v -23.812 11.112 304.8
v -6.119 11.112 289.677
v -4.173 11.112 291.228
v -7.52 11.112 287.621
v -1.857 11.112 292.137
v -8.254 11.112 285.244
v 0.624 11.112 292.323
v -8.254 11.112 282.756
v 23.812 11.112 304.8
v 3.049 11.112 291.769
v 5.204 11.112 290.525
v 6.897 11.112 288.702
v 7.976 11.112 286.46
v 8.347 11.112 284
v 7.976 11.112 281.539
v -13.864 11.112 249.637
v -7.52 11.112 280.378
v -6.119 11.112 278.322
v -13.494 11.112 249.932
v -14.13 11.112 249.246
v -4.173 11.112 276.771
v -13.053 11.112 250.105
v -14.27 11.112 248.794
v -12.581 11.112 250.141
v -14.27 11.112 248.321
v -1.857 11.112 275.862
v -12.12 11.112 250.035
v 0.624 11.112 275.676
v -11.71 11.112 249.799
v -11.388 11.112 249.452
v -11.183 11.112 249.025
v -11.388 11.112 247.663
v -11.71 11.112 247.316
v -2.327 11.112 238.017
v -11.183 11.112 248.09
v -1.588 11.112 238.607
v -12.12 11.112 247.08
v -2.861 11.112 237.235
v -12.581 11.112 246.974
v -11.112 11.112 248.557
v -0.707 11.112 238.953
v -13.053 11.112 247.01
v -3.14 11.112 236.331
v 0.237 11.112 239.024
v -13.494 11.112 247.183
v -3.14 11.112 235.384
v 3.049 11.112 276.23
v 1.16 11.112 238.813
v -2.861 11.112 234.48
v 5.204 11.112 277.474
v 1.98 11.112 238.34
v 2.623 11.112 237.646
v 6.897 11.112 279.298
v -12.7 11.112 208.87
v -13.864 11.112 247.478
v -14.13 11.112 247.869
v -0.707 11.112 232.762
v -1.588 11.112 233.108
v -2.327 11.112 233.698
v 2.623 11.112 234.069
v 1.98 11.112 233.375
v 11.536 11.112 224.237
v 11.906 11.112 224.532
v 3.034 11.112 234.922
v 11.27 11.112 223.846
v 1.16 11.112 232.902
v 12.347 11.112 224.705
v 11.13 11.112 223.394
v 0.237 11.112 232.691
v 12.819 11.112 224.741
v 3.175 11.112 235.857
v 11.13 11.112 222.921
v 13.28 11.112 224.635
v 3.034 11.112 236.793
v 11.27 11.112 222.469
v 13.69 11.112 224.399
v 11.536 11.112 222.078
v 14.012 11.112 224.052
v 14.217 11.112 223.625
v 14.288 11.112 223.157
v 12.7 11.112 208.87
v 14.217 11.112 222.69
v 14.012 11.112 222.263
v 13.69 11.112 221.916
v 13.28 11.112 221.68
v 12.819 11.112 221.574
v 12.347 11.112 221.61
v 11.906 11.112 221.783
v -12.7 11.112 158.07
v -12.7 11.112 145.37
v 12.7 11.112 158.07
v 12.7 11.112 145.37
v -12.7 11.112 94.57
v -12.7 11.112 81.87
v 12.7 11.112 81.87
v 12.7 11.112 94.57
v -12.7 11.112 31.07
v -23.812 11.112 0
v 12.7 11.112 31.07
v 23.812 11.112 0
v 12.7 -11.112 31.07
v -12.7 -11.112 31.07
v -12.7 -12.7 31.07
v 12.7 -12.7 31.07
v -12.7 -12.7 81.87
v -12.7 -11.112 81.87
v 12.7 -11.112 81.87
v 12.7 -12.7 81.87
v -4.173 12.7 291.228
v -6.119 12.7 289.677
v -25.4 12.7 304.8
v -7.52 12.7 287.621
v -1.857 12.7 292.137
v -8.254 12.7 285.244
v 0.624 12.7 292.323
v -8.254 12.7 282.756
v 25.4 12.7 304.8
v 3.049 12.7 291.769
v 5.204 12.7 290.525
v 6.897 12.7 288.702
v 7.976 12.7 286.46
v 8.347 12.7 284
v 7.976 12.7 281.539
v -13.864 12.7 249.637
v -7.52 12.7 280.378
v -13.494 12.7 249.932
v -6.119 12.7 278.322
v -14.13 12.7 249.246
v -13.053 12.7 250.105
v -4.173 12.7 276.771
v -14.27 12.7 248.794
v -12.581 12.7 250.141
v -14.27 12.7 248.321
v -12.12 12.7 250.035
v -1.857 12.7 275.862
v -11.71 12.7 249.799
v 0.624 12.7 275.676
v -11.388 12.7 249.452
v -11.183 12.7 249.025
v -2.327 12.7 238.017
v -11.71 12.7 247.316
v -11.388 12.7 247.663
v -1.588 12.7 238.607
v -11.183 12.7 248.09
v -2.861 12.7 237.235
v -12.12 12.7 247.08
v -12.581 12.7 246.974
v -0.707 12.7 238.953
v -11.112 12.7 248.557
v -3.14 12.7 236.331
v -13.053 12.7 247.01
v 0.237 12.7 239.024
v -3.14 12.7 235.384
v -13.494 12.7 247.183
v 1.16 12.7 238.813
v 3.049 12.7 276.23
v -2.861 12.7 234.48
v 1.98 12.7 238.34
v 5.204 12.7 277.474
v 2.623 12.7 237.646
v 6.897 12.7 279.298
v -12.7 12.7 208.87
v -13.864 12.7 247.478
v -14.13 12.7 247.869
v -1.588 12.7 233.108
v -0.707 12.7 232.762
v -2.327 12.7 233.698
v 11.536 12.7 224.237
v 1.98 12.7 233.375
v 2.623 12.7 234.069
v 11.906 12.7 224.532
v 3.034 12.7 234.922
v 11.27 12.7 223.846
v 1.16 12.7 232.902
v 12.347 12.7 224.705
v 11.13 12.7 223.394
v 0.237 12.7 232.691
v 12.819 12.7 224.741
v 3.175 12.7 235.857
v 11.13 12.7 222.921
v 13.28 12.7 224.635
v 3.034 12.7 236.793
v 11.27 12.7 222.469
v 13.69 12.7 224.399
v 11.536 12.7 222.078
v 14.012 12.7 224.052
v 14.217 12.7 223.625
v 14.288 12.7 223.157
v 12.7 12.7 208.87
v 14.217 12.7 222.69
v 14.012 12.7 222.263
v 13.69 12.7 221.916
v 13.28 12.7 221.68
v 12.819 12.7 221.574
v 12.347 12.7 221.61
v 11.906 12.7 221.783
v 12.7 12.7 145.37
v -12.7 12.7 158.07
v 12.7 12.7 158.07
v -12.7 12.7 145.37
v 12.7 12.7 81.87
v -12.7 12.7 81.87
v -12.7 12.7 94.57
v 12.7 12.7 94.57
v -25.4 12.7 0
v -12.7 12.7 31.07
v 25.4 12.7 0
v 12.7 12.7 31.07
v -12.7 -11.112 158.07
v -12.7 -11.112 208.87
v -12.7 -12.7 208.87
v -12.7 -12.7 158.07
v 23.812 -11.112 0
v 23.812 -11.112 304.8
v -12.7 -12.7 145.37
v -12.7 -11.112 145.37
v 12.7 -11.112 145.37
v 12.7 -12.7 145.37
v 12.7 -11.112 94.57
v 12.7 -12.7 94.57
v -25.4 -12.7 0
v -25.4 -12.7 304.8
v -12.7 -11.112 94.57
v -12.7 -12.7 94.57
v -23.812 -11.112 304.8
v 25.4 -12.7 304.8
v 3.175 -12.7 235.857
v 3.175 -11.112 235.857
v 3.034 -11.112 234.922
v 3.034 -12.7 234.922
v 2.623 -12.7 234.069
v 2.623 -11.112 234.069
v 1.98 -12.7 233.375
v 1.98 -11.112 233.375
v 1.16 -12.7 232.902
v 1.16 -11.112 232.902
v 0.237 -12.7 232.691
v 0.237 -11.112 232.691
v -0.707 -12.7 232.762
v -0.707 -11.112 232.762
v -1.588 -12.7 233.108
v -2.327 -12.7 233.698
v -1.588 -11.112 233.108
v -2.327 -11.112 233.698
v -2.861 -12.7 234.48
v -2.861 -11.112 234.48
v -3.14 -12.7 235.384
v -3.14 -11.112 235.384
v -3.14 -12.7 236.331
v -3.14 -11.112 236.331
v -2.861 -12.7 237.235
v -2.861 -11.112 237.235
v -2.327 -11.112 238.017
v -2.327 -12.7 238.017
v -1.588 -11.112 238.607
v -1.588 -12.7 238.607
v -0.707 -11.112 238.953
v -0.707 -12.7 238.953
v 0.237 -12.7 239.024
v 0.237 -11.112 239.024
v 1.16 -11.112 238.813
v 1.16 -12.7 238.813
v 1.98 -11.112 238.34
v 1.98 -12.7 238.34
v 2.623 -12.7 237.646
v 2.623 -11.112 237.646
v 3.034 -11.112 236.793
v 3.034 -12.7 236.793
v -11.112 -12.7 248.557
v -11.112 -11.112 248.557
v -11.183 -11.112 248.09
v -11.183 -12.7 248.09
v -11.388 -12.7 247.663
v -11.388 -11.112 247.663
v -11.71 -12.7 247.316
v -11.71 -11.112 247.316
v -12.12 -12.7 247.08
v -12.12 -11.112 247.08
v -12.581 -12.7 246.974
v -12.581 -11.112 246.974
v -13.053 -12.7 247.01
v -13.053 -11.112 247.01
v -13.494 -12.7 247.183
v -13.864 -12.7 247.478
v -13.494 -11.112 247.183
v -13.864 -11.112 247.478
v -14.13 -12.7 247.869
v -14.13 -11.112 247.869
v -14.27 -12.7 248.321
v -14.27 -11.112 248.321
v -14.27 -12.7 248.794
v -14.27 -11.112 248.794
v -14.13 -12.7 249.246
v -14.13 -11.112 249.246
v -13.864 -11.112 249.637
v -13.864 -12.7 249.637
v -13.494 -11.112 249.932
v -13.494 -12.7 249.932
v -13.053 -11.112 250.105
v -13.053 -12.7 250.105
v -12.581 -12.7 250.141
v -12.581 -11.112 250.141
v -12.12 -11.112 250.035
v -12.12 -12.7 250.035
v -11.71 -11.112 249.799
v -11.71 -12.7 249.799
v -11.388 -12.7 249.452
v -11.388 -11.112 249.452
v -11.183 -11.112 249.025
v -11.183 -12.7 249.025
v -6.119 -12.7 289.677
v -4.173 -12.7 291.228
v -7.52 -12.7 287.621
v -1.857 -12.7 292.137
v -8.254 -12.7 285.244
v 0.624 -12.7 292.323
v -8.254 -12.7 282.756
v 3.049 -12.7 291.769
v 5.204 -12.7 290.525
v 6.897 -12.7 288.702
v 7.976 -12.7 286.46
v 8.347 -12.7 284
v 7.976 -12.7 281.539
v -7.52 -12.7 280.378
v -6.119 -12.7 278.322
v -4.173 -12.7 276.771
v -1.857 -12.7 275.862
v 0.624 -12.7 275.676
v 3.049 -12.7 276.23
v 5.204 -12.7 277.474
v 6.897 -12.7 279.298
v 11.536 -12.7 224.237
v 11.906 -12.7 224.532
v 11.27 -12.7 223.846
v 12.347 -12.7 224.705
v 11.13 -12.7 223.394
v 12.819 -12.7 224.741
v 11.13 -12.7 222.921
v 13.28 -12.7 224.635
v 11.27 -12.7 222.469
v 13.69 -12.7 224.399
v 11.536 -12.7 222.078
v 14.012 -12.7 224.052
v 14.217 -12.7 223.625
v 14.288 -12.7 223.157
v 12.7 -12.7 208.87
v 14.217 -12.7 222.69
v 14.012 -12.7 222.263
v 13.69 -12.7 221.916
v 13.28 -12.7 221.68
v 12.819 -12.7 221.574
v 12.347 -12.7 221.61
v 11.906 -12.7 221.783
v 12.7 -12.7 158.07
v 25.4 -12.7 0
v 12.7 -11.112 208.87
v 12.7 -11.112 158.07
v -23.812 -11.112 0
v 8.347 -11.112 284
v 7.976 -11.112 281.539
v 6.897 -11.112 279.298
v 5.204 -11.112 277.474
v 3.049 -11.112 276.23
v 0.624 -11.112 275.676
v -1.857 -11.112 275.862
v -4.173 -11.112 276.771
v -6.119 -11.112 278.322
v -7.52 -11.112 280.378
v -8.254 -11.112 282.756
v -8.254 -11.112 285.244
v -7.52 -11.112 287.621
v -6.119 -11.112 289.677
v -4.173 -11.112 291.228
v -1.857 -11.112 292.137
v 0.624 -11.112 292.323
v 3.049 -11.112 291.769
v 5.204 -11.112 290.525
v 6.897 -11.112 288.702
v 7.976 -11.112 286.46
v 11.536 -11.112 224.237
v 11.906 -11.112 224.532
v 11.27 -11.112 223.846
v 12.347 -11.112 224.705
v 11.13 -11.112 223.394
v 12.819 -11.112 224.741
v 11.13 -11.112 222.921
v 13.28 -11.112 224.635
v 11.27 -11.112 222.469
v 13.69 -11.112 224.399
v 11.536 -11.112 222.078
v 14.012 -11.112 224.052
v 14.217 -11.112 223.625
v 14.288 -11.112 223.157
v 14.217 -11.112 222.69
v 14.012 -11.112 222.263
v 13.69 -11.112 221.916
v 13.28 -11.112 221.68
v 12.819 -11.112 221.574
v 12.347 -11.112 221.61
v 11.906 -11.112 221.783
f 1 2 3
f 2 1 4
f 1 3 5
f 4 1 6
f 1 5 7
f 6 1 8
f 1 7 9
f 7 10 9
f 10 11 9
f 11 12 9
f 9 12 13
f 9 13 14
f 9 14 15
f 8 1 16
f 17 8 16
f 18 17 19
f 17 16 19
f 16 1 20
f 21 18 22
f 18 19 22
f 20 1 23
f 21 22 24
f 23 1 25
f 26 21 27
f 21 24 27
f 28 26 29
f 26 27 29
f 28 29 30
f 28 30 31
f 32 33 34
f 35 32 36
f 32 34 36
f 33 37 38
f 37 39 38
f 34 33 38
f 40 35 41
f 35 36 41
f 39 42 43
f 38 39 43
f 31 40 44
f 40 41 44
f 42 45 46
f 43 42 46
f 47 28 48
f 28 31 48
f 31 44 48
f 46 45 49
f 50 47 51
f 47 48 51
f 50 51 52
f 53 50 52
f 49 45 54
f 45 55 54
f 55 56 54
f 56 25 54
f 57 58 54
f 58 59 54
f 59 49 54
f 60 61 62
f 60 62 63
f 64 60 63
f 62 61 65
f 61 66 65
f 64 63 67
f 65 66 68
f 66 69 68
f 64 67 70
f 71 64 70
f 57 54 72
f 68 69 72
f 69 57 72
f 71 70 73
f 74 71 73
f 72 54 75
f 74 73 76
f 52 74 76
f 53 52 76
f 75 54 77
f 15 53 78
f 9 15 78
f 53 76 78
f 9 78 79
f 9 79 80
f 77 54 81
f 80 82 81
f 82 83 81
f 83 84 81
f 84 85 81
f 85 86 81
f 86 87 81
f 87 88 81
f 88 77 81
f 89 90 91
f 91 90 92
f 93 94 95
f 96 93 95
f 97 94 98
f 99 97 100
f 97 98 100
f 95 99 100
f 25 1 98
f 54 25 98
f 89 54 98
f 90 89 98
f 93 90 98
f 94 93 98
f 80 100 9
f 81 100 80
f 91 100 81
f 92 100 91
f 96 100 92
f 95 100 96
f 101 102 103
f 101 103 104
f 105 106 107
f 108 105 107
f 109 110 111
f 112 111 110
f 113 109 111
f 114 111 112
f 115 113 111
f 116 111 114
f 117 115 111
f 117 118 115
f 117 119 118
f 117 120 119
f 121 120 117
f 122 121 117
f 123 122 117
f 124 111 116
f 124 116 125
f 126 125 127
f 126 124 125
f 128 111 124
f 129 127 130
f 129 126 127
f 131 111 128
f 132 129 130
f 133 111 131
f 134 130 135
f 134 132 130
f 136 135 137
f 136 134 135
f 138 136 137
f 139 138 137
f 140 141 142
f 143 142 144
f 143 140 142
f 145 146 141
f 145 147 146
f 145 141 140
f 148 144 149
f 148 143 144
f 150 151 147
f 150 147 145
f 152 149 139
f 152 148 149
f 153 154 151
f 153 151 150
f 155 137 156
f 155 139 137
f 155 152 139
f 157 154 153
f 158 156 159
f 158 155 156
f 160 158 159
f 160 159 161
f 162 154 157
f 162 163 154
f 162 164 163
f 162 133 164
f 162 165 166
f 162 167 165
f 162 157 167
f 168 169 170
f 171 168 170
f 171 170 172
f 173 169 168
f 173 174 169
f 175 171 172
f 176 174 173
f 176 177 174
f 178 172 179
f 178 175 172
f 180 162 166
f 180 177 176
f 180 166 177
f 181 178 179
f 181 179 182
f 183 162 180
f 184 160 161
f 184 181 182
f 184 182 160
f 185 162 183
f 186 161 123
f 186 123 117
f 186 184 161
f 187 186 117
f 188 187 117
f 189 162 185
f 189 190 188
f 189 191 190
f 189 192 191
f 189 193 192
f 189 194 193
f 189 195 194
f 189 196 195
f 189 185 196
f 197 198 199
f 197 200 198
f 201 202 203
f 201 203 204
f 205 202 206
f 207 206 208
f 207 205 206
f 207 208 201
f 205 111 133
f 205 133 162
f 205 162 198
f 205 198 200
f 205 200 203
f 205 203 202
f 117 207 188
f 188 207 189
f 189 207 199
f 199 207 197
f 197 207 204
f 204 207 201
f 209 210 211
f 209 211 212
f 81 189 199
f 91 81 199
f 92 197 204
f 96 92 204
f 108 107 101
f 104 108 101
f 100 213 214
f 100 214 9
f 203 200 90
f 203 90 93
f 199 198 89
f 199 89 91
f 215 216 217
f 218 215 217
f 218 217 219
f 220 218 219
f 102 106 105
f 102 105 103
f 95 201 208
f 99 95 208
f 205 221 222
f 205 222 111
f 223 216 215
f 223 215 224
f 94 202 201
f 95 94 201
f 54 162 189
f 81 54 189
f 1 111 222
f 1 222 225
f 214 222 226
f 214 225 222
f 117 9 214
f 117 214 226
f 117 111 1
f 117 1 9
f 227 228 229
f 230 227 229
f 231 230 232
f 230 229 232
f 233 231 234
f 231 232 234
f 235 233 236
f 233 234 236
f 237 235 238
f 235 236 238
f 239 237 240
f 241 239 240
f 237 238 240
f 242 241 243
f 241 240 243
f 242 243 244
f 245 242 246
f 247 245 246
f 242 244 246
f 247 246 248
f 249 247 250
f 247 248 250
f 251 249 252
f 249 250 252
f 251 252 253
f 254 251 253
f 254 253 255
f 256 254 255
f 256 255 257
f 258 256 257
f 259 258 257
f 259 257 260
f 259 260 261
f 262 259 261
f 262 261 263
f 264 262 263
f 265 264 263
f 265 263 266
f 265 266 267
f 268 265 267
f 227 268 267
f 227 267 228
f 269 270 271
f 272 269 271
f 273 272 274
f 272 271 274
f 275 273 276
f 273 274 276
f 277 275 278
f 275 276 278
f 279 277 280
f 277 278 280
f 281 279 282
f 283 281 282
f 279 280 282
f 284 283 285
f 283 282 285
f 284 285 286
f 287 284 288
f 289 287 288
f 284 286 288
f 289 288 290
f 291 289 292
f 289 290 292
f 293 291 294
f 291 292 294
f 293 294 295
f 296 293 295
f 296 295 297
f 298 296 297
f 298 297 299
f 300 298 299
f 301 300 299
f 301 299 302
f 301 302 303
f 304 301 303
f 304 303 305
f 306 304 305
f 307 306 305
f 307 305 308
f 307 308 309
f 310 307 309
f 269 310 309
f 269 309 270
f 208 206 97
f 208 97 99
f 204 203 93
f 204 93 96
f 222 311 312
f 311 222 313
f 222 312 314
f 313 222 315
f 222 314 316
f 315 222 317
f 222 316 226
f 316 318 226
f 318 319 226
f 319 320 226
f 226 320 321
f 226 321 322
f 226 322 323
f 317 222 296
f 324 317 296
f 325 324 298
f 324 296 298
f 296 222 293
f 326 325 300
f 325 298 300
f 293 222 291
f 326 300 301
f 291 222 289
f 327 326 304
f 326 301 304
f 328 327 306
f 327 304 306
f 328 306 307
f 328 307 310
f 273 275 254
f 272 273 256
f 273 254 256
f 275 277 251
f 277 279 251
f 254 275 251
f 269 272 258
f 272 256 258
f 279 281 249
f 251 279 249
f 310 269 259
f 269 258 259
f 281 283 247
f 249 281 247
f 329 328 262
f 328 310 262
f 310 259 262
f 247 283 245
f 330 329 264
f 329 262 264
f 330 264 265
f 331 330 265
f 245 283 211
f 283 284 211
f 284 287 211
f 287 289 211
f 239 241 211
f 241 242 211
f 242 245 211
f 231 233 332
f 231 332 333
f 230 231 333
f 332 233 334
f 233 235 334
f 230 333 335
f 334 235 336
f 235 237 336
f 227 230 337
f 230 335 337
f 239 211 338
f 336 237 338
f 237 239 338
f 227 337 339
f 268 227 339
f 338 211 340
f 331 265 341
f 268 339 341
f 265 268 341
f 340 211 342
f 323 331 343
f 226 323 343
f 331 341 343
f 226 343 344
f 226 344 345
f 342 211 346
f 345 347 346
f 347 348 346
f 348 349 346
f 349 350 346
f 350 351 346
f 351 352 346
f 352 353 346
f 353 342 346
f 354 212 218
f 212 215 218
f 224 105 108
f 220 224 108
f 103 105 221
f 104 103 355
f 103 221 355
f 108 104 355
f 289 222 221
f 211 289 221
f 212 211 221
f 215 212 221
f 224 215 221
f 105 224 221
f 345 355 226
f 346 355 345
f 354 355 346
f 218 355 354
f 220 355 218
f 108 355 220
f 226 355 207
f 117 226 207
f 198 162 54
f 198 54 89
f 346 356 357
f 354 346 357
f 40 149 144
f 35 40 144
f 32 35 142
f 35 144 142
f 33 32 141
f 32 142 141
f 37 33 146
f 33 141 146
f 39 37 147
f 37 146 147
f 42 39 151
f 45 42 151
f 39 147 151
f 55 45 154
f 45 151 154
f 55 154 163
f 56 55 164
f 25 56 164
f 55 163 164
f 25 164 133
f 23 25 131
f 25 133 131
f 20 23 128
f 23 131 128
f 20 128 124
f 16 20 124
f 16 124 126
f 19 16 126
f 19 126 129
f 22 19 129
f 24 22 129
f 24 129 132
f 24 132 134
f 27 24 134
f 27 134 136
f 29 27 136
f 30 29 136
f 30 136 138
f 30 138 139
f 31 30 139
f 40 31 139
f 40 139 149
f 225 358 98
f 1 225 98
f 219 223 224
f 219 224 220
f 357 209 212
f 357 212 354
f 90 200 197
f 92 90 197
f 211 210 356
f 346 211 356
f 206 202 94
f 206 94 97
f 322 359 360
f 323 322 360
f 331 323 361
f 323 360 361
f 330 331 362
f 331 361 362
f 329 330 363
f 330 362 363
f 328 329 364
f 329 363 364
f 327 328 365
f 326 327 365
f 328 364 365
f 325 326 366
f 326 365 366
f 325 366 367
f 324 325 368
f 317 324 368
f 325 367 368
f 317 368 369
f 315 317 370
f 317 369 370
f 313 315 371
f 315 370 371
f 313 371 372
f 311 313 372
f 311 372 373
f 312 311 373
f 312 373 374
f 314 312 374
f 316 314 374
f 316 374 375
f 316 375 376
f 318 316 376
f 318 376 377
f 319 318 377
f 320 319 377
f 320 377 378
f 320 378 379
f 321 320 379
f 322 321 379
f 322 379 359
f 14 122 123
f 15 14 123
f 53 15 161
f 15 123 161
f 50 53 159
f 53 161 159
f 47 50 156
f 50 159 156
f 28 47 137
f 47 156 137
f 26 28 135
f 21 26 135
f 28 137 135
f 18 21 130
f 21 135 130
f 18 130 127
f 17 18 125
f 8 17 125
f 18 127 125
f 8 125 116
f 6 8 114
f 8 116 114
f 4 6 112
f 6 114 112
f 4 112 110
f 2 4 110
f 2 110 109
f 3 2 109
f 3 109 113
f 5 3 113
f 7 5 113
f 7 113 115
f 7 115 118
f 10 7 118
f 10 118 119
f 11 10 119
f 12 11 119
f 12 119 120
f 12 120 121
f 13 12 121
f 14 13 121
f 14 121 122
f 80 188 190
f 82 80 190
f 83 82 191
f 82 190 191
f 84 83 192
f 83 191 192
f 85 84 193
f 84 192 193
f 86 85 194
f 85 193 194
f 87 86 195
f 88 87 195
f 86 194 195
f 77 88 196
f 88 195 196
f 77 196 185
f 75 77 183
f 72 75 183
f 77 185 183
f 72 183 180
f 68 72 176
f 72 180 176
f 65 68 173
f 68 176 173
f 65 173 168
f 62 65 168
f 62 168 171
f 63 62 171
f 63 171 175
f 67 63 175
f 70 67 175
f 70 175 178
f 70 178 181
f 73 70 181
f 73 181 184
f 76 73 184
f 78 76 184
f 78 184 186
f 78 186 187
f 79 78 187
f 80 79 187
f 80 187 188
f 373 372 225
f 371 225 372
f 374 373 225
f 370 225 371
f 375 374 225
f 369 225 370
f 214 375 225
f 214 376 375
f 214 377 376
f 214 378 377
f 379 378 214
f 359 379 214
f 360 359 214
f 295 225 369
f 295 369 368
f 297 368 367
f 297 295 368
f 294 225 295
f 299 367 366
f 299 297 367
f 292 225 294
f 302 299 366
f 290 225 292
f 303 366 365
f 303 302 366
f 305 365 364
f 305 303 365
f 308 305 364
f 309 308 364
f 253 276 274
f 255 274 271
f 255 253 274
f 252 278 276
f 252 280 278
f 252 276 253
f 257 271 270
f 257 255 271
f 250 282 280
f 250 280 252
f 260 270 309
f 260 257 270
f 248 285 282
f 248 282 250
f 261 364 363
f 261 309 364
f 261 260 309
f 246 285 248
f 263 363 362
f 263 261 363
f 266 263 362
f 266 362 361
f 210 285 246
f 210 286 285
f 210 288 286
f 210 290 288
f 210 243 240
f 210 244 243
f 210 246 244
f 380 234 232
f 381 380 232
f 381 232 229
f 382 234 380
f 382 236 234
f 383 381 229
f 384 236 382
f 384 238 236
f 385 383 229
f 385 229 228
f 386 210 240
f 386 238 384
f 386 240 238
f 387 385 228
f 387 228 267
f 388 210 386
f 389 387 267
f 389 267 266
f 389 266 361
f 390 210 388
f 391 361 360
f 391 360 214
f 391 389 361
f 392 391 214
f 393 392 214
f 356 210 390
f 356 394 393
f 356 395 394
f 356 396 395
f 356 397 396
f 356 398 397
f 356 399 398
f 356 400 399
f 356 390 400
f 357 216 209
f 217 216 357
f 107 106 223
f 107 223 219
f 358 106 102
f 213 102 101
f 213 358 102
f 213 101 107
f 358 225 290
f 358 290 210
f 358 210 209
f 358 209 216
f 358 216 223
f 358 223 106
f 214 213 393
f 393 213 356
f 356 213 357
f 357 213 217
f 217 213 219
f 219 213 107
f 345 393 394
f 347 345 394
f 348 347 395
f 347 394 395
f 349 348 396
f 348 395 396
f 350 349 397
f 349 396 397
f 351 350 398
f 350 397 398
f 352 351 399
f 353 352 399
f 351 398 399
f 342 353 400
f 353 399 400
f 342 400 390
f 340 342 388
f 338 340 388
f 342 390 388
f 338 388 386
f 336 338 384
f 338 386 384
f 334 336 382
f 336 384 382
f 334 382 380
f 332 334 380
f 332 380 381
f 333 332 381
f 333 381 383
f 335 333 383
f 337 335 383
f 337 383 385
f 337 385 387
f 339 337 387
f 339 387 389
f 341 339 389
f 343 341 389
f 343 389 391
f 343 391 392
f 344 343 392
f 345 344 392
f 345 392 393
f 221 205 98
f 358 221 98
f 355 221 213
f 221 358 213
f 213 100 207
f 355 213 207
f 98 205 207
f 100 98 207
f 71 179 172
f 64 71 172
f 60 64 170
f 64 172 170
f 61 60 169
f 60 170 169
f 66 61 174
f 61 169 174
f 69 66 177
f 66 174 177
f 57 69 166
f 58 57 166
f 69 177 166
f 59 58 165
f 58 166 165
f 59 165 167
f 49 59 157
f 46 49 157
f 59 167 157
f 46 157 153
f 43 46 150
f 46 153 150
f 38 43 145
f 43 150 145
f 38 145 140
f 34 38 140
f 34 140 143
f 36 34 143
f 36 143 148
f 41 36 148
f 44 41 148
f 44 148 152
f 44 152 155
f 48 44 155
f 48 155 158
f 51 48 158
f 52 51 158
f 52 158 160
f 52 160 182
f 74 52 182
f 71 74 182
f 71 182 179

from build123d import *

# Parameters (mm, degrees)
SKETCH1_W           = 50.8
SKETCH1_H           = 25.4
SKETCH1_W_2         = 47.625
SKETCH1_H_2         = 22.225
BOSS_EXTRUDE1_DEPTH = 304.8
SKETCH3_R           = 8.346891379
SKETCH3_R_2         = 3.175
SKETCH3_R_3         = 1.5875
SKETCH3_W           = 25.4
SKETCH3_H           = 50.8
CUT_EXTRUDE2_DEPTH  = 25.4


with BuildPart() as part:
    # Sketch1 → Boss-Extrude1 (new body)
    with BuildSketch(Plane.XY):
        Rectangle(SKETCH1_W, SKETCH1_H)
        Rectangle(SKETCH1_W_2, SKETCH1_H_2, mode=Mode.SUBTRACT)
    extrude(amount=BOSS_EXTRUDE1_DEPTH)

    # Sketch3 → Cut-Extrude2 (cut)
    with BuildSketch(Plane(origin=(0, 12.7, 0), x_dir=(1, 0, 0), z_dir=(0, 1, 0))):
        with Locations((0, -283.999565344)):
            Circle(SKETCH3_R)
        with Locations((0, -235.857473267)):
            Circle(SKETCH3_R_2)
        with Locations((-12.7, -248.557473267)):
            Circle(SKETCH3_R_3)
        with Locations((12.7, -223.157473267)):
            Circle(SKETCH3_R_3)
        with Locations((0, -183.469973267)):
            Rectangle(SKETCH3_W, SKETCH3_H)
        with Locations((0, -119.969973267)):
            Rectangle(SKETCH3_W, SKETCH3_H)
        with Locations((0, -56.469973267)):
            Rectangle(SKETCH3_W, SKETCH3_H)
    extrude(amount=-CUT_EXTRUDE2_DEPTH, mode=Mode.SUBTRACT)


solid = part.part
